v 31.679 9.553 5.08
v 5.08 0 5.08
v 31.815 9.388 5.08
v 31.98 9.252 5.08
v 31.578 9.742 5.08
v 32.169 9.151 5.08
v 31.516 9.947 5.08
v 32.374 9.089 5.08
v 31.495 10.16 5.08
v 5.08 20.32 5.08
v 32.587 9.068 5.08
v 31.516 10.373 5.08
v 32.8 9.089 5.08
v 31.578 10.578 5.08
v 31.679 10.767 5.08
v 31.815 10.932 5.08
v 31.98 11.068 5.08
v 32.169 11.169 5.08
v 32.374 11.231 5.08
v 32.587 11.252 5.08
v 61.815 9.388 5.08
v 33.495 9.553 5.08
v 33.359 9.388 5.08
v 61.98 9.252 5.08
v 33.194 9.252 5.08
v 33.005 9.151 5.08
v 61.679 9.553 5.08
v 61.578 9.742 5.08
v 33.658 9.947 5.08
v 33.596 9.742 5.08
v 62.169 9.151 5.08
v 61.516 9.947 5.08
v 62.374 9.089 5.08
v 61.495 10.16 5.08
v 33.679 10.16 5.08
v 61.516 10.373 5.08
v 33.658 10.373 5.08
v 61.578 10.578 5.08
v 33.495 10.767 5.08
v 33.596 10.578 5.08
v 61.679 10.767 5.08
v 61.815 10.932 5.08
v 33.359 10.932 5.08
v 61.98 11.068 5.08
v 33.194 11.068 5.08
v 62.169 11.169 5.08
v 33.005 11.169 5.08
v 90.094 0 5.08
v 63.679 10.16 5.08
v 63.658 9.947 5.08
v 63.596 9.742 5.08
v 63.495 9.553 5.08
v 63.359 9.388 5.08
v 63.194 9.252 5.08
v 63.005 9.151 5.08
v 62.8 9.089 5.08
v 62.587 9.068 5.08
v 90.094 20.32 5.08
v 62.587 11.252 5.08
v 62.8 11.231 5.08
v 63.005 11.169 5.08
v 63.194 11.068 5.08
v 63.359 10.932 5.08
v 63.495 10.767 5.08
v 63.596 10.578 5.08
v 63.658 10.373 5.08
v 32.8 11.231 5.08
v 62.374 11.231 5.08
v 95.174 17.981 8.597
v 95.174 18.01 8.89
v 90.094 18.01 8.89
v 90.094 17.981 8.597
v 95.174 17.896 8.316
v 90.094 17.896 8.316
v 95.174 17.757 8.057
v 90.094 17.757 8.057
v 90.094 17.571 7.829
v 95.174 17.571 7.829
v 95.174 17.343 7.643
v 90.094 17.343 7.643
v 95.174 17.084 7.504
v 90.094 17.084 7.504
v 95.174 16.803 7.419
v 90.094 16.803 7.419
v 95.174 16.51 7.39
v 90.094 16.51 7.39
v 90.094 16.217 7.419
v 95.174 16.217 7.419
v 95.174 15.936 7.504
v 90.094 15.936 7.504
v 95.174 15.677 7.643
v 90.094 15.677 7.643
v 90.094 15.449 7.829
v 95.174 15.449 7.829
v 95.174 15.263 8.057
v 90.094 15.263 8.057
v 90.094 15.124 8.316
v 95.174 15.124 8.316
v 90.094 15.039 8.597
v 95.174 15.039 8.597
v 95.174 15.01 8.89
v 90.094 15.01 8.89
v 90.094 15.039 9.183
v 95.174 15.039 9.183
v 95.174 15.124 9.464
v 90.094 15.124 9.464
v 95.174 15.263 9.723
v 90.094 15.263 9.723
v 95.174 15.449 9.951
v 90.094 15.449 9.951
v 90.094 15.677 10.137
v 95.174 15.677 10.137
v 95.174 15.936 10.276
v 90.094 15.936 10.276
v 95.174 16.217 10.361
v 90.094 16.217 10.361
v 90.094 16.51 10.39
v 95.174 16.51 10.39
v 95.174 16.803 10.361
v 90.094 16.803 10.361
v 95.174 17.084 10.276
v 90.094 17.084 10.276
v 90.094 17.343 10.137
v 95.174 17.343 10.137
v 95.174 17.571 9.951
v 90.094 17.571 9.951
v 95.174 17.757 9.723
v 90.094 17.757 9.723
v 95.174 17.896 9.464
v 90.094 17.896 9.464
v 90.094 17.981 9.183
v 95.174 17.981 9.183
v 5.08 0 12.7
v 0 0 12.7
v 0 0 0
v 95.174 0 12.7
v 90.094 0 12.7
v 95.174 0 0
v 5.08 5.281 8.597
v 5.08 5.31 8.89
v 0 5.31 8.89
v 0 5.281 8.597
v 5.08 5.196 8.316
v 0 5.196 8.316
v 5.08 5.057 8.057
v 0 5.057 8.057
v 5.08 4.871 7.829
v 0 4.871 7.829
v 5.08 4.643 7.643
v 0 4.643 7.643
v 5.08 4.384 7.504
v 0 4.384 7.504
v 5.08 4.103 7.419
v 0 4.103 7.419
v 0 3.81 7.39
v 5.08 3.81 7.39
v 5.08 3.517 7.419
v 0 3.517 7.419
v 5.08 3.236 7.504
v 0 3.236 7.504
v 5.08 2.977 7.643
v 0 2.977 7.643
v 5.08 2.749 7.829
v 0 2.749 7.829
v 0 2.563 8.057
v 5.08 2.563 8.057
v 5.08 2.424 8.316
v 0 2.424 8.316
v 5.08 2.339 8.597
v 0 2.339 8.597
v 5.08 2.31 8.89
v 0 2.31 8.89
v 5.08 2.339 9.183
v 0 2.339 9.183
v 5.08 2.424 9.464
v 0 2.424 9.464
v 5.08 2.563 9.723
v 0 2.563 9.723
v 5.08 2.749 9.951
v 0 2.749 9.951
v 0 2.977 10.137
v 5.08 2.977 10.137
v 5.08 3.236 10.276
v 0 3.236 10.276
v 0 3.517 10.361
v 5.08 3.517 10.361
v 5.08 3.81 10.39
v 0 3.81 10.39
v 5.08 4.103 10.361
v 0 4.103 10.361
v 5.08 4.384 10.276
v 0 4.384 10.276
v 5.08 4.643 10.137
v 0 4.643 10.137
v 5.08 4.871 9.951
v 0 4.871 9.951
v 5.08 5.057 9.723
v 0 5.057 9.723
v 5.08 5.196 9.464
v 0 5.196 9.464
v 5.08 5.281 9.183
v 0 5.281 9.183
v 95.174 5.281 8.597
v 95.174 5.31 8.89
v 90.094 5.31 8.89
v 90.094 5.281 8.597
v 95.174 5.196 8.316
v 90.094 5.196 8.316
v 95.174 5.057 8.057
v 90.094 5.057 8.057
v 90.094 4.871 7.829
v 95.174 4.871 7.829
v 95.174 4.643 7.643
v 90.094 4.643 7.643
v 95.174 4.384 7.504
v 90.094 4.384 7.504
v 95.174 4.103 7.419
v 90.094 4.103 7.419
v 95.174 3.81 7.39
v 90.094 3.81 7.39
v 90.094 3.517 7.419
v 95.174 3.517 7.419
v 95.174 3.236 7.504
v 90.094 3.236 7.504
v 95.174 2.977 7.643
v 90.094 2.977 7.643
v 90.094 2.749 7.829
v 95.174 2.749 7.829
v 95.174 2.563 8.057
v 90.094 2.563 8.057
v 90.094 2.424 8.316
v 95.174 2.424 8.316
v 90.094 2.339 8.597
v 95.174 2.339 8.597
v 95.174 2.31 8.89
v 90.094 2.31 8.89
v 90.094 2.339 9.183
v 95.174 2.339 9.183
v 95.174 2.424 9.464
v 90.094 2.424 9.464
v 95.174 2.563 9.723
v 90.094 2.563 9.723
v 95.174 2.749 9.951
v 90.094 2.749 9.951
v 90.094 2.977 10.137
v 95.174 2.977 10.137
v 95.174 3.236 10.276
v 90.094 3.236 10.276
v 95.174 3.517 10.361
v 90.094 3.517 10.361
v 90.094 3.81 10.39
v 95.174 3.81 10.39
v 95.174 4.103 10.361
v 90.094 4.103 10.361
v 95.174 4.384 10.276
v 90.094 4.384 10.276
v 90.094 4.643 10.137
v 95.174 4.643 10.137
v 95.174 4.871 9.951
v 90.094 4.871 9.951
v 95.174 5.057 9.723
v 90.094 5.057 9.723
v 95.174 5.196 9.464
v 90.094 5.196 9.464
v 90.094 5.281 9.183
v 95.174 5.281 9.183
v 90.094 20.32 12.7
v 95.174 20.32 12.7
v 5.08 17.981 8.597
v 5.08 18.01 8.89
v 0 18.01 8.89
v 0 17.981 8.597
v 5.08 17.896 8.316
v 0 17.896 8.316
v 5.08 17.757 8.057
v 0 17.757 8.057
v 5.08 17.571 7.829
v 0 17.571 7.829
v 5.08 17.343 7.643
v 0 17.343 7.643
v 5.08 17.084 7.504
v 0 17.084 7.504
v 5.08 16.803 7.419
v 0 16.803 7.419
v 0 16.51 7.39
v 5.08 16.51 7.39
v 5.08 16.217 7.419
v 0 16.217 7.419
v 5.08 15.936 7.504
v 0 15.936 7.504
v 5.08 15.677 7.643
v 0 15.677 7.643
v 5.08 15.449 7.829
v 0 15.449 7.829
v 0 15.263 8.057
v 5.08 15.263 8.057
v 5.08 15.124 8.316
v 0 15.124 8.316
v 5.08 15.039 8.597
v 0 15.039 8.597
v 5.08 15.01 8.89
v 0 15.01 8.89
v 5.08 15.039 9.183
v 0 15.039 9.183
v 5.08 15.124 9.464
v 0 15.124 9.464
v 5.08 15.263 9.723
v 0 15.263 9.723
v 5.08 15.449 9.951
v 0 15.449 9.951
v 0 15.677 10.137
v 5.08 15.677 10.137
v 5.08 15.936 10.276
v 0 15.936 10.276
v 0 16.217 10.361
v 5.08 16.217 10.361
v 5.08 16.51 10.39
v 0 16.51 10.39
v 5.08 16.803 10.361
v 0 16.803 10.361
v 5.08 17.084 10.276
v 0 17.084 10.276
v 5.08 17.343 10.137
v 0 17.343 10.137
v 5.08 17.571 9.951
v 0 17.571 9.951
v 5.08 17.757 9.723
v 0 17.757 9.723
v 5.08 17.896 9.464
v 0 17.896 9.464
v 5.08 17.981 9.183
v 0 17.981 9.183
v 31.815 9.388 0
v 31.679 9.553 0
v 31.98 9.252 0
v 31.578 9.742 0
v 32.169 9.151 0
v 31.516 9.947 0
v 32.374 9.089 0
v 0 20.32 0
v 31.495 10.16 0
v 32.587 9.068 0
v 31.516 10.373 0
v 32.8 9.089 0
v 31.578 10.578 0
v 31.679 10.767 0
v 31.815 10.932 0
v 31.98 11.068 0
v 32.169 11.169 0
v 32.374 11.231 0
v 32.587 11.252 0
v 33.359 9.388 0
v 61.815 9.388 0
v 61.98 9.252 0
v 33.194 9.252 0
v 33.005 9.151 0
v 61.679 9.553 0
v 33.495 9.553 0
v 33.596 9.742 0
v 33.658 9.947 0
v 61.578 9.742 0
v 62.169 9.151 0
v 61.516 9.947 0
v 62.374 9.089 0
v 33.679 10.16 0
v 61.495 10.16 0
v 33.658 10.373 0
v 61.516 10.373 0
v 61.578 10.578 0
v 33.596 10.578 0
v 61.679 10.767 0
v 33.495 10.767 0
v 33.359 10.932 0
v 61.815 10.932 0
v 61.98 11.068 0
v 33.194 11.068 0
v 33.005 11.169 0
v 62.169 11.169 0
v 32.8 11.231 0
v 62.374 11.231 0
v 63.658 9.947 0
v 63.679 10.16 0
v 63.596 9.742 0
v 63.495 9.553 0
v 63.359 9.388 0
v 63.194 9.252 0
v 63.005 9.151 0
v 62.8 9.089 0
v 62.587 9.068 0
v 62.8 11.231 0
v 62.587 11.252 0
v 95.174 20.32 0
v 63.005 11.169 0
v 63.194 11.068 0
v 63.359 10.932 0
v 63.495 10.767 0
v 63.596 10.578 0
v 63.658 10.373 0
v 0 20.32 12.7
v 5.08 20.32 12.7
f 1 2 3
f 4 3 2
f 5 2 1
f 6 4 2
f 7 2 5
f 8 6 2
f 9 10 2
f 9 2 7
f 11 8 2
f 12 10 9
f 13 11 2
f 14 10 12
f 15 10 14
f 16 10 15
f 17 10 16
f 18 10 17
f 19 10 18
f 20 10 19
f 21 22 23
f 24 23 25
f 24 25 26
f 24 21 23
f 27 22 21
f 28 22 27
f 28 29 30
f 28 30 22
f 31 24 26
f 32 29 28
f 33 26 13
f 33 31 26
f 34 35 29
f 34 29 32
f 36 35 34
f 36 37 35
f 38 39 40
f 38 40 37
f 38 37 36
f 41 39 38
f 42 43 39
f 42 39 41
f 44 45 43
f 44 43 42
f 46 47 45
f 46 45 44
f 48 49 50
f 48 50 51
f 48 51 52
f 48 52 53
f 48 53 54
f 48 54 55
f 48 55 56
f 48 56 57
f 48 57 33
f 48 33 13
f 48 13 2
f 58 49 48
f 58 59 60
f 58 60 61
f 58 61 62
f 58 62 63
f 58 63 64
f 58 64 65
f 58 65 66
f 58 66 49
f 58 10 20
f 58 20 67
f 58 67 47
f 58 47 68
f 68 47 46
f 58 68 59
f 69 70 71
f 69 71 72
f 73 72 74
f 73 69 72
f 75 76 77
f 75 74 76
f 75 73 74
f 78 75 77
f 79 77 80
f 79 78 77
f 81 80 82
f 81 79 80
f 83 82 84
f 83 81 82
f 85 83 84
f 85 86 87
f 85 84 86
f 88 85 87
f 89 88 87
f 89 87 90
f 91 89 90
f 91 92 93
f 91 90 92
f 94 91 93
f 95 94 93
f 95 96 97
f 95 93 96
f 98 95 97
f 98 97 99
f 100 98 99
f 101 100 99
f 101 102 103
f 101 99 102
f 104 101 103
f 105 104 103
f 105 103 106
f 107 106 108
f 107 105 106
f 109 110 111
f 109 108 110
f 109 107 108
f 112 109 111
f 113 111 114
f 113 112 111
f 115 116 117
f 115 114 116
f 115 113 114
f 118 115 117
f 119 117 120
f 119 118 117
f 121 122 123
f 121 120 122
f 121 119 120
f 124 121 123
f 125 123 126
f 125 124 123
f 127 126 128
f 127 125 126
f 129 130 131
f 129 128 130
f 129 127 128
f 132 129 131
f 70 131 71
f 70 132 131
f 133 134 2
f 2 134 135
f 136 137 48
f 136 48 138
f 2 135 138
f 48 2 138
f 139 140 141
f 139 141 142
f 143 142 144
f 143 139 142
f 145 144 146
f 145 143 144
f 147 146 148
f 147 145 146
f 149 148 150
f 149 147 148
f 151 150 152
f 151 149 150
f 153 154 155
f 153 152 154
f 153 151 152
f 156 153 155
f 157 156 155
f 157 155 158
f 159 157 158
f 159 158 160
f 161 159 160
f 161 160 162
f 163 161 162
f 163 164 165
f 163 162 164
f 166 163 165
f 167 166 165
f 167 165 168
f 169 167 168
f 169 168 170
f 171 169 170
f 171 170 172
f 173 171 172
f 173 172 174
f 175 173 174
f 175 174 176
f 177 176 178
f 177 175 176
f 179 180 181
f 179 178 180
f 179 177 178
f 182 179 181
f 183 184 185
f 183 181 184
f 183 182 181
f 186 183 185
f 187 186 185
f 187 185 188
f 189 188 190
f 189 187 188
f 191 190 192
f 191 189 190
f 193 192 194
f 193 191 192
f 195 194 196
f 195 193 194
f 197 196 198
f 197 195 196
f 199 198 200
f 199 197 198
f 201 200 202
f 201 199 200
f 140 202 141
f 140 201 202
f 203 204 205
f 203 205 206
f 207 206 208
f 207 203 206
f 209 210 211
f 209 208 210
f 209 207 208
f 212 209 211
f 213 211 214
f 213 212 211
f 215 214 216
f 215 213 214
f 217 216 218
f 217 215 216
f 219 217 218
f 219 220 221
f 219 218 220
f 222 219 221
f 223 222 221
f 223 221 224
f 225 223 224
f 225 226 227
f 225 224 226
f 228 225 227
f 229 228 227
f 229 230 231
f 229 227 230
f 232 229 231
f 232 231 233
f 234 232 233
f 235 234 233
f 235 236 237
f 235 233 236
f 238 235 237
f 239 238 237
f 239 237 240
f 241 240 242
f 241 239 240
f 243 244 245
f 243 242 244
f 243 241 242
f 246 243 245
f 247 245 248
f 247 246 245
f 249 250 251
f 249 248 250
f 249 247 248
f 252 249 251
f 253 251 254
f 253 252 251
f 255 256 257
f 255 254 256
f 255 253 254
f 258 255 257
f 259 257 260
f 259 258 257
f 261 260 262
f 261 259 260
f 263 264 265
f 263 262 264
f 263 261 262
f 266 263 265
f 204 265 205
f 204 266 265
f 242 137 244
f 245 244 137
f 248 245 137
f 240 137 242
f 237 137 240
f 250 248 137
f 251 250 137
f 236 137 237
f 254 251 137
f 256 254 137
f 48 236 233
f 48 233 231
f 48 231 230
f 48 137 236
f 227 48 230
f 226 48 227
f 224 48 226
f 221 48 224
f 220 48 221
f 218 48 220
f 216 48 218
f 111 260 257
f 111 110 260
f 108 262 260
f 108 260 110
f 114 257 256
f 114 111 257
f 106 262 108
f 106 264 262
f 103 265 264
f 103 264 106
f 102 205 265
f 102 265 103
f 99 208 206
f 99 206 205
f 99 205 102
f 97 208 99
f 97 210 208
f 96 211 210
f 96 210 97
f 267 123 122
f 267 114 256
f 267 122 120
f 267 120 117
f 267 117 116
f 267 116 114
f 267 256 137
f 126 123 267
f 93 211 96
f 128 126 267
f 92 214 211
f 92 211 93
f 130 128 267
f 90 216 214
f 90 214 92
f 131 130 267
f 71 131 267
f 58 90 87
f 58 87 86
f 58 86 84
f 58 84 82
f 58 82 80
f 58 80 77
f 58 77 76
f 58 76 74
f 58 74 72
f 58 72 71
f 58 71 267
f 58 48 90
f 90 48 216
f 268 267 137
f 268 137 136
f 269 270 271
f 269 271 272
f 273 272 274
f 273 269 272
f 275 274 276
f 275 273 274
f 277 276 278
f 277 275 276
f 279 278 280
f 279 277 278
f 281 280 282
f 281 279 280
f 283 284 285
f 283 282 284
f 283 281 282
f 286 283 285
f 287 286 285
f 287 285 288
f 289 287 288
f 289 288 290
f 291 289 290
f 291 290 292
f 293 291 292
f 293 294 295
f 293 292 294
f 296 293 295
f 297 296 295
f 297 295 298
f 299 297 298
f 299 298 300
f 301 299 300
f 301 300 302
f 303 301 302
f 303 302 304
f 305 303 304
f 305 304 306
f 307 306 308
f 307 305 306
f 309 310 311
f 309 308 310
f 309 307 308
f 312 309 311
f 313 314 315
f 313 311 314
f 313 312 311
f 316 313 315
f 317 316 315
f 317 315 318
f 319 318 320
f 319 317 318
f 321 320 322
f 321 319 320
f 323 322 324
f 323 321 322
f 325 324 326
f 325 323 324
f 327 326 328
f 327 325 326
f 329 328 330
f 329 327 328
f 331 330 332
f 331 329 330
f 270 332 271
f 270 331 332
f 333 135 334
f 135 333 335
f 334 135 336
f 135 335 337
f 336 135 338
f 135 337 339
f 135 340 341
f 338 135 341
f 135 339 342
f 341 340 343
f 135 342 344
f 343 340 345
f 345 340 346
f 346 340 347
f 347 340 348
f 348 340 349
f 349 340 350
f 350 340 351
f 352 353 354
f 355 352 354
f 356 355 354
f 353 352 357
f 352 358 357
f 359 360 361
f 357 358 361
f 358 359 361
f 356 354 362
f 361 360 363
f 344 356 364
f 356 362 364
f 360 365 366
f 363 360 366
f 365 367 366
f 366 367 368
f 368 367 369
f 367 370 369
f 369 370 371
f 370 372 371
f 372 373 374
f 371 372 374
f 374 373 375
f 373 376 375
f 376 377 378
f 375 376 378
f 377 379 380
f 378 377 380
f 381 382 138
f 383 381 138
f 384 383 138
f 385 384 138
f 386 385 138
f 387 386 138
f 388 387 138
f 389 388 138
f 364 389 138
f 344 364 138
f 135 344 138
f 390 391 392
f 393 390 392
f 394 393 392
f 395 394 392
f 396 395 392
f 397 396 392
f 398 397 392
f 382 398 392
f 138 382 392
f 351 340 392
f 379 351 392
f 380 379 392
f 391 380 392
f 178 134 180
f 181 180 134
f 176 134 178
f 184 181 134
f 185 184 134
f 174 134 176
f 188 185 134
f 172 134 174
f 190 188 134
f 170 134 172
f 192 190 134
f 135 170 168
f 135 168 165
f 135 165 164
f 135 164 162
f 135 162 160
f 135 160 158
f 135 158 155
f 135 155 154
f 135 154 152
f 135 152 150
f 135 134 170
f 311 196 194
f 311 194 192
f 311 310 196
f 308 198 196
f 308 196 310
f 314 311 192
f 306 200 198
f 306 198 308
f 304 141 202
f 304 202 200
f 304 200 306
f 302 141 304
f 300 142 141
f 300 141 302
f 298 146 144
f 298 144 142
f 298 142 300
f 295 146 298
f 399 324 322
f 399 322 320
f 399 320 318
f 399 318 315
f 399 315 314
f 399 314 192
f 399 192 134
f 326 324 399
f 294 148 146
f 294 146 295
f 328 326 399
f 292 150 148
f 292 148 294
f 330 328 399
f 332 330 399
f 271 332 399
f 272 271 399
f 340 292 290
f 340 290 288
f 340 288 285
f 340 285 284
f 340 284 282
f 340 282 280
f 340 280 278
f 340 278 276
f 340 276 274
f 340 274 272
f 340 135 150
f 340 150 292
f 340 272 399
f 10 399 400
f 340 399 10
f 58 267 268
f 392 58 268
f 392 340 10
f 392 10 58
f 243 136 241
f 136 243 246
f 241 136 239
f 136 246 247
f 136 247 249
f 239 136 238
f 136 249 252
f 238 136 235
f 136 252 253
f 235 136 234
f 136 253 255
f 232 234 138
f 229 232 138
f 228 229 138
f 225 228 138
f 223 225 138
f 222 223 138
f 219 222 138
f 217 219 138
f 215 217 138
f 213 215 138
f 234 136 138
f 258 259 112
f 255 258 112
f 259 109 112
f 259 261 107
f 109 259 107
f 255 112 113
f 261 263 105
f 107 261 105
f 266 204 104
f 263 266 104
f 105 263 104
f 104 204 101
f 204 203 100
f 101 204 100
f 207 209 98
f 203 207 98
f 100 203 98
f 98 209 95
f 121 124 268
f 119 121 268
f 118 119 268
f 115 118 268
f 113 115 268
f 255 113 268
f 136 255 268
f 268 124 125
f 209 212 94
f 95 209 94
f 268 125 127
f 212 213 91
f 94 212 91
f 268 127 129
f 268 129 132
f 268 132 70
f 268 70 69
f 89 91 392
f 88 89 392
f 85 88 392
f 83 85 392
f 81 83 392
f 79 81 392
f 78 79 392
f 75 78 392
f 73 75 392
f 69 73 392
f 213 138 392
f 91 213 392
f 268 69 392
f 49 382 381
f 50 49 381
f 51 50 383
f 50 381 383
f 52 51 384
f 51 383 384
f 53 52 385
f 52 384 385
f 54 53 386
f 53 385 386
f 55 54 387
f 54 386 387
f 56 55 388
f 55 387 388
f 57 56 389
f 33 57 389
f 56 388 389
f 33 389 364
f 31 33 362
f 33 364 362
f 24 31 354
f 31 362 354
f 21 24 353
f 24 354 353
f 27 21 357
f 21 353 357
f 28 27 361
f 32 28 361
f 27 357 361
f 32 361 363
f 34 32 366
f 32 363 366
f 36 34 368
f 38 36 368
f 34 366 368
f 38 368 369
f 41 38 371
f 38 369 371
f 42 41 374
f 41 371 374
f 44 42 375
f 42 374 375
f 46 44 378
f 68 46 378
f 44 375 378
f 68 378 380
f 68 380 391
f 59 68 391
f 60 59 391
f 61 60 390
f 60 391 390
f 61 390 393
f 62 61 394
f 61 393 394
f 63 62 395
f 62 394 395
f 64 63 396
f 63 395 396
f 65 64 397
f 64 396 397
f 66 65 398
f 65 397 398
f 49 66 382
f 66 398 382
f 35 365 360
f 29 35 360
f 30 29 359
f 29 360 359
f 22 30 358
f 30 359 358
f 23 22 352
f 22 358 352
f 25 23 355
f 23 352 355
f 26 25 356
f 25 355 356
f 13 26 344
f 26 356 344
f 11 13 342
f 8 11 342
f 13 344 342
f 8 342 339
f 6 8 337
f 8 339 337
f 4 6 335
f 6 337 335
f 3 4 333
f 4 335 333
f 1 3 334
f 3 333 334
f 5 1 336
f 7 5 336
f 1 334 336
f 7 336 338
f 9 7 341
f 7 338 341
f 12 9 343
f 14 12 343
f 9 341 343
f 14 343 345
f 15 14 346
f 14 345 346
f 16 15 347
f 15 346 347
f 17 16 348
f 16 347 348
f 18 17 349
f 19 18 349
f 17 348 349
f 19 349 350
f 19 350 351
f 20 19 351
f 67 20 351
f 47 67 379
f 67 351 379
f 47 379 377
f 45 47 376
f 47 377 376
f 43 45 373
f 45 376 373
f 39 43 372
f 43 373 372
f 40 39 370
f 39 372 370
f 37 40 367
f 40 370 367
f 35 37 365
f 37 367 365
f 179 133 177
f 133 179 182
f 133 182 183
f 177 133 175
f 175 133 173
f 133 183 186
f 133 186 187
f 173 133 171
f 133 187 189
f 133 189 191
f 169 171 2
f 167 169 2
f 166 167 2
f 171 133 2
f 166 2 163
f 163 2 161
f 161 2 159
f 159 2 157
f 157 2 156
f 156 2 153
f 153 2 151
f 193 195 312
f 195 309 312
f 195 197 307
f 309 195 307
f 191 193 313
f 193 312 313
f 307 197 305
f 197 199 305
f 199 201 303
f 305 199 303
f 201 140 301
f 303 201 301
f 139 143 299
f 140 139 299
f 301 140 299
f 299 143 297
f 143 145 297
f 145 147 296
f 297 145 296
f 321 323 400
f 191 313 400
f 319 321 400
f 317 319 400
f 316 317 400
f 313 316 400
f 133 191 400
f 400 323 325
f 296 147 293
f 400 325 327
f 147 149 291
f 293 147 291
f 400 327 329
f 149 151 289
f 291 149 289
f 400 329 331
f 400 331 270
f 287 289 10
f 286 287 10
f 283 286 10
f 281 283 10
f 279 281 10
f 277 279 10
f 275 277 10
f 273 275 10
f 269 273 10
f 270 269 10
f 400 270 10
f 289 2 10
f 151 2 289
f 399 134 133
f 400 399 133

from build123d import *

# Parameters (mm, degrees)
SKETCH1_W               = 85.0138
SKETCH1_H               = 20.32
SKETCH1_R               = 1.0922
BOSS_EXTRUDE1_DEPTH     = 5.08
SKETCH1_3_W             = 5.08
SKETCH1_3_H             = 20.32
BOSS_EXTRUDE2_DEPTH     = 12.7
CUT_EXTRUDE1_DEPTH      = 94.22598993
CUT_EXTRUDE1_DEPTH_BACK = 94.22598993
SKETCH2_R               = 1.5


with BuildPart() as part:
    # Sketch1 → Boss-Extrude1 (new body)
    with BuildSketch(Plane.XY):
        with Locations((47.5869, 10.16)):
            Rectangle(SKETCH1_W, SKETCH1_H)
        with Locations((62.5869, 10.16)):
            Circle(SKETCH1_R, mode=Mode.SUBTRACT)
        with Locations((32.5869, 10.16)):
            Circle(SKETCH1_R, mode=Mode.SUBTRACT)
    extrude(amount=BOSS_EXTRUDE1_DEPTH)

    # Sketch1<3> → Boss-Extrude2 (add)
    with BuildSketch(Plane.XY):
        with Locations((92.6338, 10.16)):
            Rectangle(SKETCH1_3_W, SKETCH1_3_H)
        with Locations((2.54, 10.16)):
            Rectangle(SKETCH1_3_W, SKETCH1_3_H)
    extrude(amount=BOSS_EXTRUDE2_DEPTH)

    # Sketch2 → Cut-Extrude1 (cut, two sides: drawn at the far end of the back side and taken through both)
    with BuildSketch(Plane.ZY.offset(-90.0938).offset(-CUT_EXTRUDE1_DEPTH_BACK)):
        with Locations((8.89, 16.51)):
            Circle(SKETCH2_R)
        with Locations((8.89, 3.81)):
            Circle(SKETCH2_R)
    extrude(amount=CUT_EXTRUDE1_DEPTH + CUT_EXTRUDE1_DEPTH_BACK, mode=Mode.SUBTRACT)


solid = part.part
